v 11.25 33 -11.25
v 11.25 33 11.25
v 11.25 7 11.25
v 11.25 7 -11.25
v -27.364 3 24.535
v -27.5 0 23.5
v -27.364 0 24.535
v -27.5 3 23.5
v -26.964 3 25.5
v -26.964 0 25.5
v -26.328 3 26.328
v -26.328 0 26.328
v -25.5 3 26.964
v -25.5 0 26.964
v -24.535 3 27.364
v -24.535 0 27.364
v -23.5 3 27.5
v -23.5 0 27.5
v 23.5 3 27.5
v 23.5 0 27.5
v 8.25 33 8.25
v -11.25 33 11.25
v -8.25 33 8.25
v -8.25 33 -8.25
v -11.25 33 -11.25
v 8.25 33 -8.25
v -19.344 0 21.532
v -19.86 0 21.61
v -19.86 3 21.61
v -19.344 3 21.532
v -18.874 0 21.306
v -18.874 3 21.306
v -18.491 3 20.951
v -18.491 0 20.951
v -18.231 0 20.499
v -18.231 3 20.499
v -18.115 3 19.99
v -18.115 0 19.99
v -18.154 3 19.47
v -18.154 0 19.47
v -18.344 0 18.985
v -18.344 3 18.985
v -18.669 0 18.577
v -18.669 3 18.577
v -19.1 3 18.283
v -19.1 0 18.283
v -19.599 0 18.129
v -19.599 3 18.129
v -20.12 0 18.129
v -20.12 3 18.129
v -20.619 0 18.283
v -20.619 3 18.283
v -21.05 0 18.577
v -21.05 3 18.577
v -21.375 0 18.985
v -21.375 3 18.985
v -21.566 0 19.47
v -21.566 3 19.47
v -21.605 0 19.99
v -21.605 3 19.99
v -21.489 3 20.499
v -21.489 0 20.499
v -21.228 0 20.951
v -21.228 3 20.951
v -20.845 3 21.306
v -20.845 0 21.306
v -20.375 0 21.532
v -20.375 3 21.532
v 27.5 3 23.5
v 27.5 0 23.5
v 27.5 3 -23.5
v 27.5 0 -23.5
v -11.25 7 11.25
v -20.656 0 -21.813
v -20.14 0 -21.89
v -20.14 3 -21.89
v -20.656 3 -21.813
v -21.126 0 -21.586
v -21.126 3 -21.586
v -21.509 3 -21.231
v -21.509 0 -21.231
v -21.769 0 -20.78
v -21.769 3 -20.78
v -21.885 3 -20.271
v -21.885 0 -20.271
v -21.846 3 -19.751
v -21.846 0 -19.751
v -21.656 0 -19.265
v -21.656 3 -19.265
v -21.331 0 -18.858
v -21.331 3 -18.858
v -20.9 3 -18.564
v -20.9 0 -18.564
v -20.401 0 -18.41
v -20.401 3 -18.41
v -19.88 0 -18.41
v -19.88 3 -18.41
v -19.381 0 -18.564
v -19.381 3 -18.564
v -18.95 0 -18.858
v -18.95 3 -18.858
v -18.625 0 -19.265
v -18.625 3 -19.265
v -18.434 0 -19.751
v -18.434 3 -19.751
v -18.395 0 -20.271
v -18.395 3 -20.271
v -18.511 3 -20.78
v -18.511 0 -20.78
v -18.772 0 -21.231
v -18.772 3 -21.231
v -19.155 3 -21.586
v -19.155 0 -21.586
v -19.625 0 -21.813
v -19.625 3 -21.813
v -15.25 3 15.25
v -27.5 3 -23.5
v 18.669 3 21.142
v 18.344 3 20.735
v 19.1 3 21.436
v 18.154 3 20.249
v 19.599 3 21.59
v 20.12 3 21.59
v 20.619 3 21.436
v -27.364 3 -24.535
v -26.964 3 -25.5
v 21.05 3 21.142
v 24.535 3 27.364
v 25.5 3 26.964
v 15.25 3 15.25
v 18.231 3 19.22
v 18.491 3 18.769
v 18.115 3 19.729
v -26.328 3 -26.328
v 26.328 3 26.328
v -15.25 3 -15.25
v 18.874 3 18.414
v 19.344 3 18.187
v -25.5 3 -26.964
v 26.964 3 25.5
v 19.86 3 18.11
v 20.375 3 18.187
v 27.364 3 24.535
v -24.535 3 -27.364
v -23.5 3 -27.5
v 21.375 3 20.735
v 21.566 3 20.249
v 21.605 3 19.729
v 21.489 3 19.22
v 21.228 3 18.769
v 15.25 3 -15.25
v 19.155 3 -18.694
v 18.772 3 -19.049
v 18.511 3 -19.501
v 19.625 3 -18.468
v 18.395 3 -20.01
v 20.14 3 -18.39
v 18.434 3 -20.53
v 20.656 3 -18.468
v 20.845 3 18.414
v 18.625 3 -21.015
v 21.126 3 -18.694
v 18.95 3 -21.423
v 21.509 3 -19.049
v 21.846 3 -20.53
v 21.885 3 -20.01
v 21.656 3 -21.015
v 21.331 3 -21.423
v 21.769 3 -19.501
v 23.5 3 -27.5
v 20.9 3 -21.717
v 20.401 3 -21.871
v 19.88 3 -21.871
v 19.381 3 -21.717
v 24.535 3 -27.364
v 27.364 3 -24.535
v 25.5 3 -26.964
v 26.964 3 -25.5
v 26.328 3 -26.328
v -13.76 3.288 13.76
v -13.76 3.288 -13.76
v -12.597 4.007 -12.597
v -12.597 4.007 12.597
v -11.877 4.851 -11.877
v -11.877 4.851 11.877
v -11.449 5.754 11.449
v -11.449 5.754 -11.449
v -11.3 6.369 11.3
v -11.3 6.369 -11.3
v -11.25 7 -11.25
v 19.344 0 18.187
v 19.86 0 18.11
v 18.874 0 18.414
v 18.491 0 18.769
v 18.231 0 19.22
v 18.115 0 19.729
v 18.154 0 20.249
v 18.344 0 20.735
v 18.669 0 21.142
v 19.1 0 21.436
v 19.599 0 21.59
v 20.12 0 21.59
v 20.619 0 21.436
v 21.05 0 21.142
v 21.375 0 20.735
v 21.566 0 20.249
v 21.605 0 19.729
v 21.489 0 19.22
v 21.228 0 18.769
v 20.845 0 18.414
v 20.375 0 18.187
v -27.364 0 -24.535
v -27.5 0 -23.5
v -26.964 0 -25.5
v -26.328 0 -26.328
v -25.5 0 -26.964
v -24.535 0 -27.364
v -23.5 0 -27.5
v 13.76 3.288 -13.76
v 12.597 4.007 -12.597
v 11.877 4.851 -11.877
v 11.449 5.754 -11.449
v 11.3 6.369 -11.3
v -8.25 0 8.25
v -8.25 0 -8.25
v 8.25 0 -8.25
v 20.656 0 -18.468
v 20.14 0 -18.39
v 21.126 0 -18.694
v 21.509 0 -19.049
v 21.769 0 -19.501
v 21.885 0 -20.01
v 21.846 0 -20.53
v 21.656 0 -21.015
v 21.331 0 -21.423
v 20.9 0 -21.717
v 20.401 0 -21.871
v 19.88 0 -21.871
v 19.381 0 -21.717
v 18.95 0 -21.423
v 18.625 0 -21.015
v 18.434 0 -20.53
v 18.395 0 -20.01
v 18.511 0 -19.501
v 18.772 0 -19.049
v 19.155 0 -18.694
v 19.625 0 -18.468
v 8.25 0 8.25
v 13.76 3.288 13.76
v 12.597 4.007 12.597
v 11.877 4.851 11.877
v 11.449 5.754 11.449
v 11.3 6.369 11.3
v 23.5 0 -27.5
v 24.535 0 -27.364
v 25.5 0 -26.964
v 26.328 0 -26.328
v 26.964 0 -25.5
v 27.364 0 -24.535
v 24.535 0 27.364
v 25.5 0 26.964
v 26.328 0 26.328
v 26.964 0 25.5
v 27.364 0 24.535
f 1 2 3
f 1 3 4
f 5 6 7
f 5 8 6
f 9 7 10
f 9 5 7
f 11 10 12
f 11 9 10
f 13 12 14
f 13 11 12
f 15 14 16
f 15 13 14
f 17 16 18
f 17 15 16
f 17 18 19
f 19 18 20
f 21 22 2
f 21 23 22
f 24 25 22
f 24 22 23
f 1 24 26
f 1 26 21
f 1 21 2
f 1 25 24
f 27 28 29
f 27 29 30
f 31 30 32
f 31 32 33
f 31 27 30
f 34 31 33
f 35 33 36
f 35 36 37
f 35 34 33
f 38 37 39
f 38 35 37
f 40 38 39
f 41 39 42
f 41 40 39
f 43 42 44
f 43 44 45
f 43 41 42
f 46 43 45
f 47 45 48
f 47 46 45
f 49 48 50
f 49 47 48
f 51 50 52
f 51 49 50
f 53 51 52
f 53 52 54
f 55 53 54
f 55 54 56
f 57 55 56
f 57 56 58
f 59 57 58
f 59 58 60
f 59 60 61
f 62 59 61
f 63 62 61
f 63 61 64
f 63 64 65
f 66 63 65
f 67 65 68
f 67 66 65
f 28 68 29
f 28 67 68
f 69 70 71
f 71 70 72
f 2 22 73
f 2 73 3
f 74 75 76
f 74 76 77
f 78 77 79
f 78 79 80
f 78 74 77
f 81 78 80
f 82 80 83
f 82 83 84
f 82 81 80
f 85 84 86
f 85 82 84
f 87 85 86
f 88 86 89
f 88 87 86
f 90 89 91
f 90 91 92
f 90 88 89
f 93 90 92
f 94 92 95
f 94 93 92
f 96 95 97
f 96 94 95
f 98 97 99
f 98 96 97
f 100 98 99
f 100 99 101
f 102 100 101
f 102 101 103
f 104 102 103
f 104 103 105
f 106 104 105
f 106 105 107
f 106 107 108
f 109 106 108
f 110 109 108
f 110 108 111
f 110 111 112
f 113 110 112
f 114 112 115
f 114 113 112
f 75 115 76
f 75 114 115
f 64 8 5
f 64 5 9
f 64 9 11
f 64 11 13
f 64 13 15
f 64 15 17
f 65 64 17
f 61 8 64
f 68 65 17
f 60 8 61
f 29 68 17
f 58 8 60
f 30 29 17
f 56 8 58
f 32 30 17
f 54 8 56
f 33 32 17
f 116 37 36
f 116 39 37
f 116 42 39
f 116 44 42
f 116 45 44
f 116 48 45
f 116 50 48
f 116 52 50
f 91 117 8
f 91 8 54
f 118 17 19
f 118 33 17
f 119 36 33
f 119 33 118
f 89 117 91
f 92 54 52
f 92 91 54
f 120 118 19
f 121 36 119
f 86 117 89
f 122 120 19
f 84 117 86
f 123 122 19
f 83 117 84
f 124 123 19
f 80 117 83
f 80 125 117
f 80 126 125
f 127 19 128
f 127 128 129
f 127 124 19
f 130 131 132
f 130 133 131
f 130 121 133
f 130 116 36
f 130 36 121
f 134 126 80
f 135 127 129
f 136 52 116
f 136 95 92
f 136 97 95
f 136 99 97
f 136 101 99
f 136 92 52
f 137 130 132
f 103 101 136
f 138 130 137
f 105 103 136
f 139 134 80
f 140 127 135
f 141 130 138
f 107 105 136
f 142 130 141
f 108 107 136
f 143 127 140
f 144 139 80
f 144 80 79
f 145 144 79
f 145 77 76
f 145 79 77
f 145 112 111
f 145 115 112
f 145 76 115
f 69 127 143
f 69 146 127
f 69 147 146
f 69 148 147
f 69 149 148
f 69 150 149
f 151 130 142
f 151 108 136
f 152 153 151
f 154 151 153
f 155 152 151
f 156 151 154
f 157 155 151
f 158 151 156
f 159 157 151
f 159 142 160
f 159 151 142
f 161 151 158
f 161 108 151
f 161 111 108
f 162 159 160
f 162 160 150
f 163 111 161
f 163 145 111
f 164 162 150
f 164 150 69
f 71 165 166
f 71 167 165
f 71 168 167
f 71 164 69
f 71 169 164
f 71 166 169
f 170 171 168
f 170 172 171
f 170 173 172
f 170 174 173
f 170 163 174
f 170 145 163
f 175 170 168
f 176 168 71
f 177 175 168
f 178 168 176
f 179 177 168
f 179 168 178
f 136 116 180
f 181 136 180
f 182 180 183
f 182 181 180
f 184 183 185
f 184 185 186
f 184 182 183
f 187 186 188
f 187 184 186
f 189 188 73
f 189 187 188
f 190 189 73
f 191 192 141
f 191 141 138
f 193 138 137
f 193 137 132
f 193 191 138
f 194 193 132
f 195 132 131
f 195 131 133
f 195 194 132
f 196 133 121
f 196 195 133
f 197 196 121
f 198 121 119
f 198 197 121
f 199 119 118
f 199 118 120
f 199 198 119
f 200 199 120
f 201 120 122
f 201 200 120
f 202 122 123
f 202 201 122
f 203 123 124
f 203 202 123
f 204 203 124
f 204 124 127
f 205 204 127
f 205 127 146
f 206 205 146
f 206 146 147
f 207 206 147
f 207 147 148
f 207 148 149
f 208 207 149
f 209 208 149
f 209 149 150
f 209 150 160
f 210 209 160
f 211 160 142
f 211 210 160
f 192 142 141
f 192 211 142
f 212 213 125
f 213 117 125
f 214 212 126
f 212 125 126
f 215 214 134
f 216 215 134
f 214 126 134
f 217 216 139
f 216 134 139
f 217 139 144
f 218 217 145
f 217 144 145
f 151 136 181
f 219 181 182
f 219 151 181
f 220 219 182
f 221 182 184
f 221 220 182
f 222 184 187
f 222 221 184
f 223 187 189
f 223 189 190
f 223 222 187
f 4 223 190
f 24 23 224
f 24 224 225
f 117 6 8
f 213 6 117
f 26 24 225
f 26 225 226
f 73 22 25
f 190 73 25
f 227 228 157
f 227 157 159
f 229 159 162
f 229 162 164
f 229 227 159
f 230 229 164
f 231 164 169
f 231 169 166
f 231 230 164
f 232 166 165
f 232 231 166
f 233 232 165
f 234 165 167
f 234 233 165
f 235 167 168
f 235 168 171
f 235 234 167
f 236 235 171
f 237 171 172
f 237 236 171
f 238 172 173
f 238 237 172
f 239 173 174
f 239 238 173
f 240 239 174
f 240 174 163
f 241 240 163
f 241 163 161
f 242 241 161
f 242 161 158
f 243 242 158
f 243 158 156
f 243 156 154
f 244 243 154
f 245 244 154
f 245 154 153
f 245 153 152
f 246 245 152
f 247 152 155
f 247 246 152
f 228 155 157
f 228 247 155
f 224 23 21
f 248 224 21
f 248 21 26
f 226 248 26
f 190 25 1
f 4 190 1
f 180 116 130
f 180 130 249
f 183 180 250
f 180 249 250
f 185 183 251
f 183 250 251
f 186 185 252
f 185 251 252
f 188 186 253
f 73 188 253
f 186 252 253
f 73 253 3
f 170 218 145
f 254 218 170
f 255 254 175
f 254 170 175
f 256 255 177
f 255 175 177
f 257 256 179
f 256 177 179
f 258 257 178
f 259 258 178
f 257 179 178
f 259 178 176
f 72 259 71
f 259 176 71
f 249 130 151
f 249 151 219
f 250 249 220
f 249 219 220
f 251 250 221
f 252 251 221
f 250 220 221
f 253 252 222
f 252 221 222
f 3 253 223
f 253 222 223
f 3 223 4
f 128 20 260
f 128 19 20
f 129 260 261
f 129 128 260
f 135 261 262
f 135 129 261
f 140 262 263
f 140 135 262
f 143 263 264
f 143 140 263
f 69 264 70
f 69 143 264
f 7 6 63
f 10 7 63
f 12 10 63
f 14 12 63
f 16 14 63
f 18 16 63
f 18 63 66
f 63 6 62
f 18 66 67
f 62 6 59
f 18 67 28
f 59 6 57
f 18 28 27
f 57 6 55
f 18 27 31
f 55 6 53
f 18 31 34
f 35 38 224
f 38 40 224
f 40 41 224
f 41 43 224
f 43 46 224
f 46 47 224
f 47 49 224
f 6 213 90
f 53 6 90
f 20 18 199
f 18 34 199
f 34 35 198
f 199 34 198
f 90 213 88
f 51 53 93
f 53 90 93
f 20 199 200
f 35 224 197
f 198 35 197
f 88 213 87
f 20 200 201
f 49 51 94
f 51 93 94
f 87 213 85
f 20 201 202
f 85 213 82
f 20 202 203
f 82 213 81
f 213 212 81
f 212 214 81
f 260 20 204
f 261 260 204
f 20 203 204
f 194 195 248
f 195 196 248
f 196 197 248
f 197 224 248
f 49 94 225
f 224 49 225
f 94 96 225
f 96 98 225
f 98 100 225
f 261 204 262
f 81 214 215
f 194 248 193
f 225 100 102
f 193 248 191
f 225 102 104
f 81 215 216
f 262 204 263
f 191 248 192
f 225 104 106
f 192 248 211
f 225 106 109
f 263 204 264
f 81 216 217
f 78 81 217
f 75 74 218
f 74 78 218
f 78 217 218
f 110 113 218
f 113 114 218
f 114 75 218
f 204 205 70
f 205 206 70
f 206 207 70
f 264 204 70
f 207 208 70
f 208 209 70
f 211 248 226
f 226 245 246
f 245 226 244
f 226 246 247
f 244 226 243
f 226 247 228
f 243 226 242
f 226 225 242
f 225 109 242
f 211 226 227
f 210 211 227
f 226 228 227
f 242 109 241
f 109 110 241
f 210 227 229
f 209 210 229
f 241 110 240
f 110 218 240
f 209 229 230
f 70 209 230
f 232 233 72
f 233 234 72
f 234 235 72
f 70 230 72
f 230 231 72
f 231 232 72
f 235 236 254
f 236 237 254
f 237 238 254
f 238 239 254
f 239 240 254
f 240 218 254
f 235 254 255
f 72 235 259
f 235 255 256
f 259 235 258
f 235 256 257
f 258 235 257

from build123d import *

# Parameters (mm, degrees)
SKETCH1_W           = 55
SKETCH1_H           = 55
SKETCH1_R           = 1.75
BOSS_EXTRUDE1_DEPTH = 3
SKETCH2_W           = 22.5
SKETCH2_H           = 22.5
SKETCH2_W_2         = 16.5
SKETCH2_H_2         = 16.5
BOSS_EXTRUDE2_DEPTH = 30
SKETCH3_W           = 16.5
SKETCH3_H           = 16.5
CUT_EXTRUDE1_DEPTH  = 30
FILLET1_R           = 4
FILLET2_R           = 4


with BuildPart() as part:
    # Sketch1 → Boss-Extrude1 (new body)
    with BuildSketch(Plane(origin=(0, 0, 0), x_dir=(1, 0, 0), z_dir=(0, 1, 0))):
        Rectangle(SKETCH1_W, SKETCH1_H)
        with Locations(Location((20.140368527, 20.140368527, 0), (0, 0, 270))):
            Circle(SKETCH1_R, mode=Mode.SUBTRACT)
        with Locations(Location((-19.859631473, -19.859631473, 0), (0, 0, 270))):
            Circle(SKETCH1_R, mode=Mode.SUBTRACT)
        with Locations(Location((-20.140368527, 20.140368527, 0), (0, 0, 90))):
            Circle(SKETCH1_R, mode=Mode.SUBTRACT)
        with Locations(Location((19.859631473, -19.859631473, 0), (0, 0, 90))):
            Circle(SKETCH1_R, mode=Mode.SUBTRACT)
    extrude(amount=BOSS_EXTRUDE1_DEPTH)

    # Sketch2 → Boss-Extrude2 (add)
    with BuildSketch(Plane(origin=(0, 3, 0), x_dir=(1, 0, 0), z_dir=(0, 1, 0))):
        Rectangle(SKETCH2_W, SKETCH2_H)
        Rectangle(SKETCH2_W_2, SKETCH2_H_2, mode=Mode.SUBTRACT)
    extrude(amount=BOSS_EXTRUDE2_DEPTH)

    # Sketch3 → Cut-Extrude1 (cut)
    with BuildSketch(Plane(origin=(0, 3, 0), x_dir=(1, 0, 0), z_dir=(0, 1, 0))):
        Rectangle(SKETCH3_W, SKETCH3_H)
    extrude(amount=-CUT_EXTRUDE1_DEPTH, mode=Mode.SUBTRACT)

    # Fillet1
    fillet1_edges = [part.edges().sort_by_distance(p)[0] for p in [
        (-11.25, 3, 0),
        (0, 3, 11.25),
        (11.25, 3, 0),
        (0, 3, -11.25),
    ]]
    fillet(fillet1_edges, radius=FILLET1_R)

    # Fillet2
    fillet2_edges = [part.edges().sort_by_distance(p)[0] for p in [
        (27.5, 1.5, 27.5),
        (-27.5, 1.5, 27.5),
        (-27.5, 1.5, -27.5),
        (27.5, 1.5, -27.5),
    ]]
    fillet(fillet2_edges, radius=FILLET2_R)


solid = part.part
